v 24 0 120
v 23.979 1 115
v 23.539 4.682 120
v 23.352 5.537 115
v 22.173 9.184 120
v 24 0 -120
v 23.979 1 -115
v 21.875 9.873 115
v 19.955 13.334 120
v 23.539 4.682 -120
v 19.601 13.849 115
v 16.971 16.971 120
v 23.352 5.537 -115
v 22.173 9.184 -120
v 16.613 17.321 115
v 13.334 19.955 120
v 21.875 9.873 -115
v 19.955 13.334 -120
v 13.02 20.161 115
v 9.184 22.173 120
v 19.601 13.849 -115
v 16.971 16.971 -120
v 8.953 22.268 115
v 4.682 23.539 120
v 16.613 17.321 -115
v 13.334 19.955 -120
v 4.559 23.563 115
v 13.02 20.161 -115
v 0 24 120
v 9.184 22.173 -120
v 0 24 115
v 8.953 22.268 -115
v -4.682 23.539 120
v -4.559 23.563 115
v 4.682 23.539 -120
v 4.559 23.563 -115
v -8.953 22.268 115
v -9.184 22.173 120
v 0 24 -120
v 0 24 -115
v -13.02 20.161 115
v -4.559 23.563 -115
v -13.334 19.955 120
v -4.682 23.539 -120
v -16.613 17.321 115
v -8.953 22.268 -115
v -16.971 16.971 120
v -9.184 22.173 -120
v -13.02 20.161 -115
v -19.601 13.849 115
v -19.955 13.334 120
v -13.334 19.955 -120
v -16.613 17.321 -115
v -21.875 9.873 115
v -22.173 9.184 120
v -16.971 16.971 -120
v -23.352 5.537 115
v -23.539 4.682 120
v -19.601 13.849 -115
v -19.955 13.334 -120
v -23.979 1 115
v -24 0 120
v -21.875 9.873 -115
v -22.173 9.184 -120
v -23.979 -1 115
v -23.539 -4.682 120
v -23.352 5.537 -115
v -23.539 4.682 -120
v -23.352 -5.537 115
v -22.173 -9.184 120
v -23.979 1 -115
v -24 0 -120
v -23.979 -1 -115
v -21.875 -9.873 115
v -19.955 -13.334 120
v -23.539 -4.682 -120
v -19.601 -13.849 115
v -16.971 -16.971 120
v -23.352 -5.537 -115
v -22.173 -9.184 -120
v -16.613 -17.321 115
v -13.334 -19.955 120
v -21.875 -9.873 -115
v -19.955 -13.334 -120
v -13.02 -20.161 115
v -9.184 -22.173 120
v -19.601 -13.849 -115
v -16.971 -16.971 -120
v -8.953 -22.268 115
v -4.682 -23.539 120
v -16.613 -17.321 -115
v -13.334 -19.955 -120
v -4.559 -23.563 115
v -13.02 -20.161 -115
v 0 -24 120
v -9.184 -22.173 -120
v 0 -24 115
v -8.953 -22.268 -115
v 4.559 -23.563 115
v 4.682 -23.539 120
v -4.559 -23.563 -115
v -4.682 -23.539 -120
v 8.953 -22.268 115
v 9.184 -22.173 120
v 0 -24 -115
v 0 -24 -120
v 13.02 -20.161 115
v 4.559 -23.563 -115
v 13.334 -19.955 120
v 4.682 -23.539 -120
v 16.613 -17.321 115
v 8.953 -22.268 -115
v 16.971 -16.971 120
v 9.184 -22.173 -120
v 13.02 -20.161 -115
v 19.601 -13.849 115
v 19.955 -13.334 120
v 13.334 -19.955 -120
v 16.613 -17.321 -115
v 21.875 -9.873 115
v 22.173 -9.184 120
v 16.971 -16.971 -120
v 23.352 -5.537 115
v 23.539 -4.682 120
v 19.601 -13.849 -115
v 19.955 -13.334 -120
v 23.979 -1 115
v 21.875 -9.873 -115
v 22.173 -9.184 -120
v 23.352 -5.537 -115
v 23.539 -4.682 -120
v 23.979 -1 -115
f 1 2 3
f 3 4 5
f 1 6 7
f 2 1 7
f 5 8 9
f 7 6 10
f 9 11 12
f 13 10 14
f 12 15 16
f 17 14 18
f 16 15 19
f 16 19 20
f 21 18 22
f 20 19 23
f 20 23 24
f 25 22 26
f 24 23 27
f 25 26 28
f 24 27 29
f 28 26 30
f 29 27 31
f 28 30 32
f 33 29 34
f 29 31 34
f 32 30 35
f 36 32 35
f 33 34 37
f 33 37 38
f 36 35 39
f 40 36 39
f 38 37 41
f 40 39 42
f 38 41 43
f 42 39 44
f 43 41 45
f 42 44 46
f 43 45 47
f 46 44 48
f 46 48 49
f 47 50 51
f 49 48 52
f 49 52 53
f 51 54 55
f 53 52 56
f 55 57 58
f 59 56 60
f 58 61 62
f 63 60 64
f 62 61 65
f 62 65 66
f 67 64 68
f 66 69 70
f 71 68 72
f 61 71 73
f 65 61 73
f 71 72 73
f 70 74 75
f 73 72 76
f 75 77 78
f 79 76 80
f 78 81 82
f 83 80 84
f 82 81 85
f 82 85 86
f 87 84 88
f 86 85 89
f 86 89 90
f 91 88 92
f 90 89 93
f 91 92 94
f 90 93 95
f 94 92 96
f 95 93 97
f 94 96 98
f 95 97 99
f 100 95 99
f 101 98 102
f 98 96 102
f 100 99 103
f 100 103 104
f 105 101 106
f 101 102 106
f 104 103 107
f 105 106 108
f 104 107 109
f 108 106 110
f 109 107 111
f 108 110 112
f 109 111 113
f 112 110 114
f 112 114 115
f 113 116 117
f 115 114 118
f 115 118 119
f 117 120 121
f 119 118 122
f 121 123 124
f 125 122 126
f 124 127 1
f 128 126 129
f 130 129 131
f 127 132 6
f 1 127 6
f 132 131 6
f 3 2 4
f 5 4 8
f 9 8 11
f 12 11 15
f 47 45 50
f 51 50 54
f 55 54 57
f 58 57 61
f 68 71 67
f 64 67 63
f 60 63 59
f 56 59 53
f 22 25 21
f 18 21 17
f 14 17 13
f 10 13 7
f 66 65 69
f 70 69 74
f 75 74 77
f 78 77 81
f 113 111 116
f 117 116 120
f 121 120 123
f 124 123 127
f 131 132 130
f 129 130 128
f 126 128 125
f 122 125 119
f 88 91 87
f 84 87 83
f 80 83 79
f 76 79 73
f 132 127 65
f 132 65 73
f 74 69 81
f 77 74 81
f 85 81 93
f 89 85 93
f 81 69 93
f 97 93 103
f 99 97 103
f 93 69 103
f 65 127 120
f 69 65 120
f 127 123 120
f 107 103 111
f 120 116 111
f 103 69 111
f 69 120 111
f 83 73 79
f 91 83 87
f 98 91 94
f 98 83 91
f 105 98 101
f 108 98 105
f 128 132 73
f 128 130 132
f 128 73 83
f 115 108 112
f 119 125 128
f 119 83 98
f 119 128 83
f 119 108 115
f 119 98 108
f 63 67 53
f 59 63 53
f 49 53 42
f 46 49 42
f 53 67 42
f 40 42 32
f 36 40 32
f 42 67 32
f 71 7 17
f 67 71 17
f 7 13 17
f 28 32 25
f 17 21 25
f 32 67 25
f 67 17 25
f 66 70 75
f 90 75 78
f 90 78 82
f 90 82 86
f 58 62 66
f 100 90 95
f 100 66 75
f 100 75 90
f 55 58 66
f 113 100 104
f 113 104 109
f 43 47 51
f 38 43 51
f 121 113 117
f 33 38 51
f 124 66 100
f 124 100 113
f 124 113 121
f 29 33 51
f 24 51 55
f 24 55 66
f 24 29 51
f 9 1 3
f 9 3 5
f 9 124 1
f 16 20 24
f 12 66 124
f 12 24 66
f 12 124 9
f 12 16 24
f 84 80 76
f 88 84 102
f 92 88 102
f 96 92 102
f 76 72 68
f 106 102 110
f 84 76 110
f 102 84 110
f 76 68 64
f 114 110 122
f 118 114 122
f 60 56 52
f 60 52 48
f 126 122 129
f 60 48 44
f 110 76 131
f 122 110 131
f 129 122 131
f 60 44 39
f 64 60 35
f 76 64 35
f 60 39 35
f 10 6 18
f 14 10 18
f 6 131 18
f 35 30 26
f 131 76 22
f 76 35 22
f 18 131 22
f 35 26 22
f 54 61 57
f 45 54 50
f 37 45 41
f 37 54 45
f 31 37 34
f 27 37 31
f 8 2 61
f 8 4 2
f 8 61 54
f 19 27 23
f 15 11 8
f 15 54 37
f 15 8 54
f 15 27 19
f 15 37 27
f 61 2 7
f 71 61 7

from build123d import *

# Parameters (mm, degrees)
BOSS_EXTRU_2_DEPTH      = 120
BOSS_EXTRU_2_DEPTH_BACK = 120
ESQUISSE1_R             = 24
ESQUISSE2_W             = 230
ESQUISSE2_H             = 23
ENL_V_MAT_EXTRU_1_DEPTH = 125.707658145


with BuildPart() as part:
    # Esquisse1 → Boss.-Extru.2 (new, two sides: drawn at the far end of the back side and taken through both)
    with BuildSketch(Plane.XY.offset(-BOSS_EXTRU_2_DEPTH_BACK)):
        Circle(ESQUISSE1_R)
    extrude(amount=BOSS_EXTRU_2_DEPTH + BOSS_EXTRU_2_DEPTH_BACK)

    # Esquisse2 → Enlèv. mat.-Extru.1 (cut, symmetric)
    with BuildSketch(Plane(origin=(0, 0, 0), x_dir=(0, 0, -1), z_dir=(1, 0, 0))):
        with Locations((0, 12.5)):
            Rectangle(ESQUISSE2_W, ESQUISSE2_H)
    enl_v_mat_extru_1 = extrude(amount=ENL_V_MAT_EXTRU_1_DEPTH, both=True, mode=Mode.SUBTRACT)

    # Symétrie1: Enlèv. mat.-Extru.1 across plane
    add(enl_v_mat_extru_1.mirror(Plane.ZX), mode=Mode.SUBTRACT)


solid = part.part
